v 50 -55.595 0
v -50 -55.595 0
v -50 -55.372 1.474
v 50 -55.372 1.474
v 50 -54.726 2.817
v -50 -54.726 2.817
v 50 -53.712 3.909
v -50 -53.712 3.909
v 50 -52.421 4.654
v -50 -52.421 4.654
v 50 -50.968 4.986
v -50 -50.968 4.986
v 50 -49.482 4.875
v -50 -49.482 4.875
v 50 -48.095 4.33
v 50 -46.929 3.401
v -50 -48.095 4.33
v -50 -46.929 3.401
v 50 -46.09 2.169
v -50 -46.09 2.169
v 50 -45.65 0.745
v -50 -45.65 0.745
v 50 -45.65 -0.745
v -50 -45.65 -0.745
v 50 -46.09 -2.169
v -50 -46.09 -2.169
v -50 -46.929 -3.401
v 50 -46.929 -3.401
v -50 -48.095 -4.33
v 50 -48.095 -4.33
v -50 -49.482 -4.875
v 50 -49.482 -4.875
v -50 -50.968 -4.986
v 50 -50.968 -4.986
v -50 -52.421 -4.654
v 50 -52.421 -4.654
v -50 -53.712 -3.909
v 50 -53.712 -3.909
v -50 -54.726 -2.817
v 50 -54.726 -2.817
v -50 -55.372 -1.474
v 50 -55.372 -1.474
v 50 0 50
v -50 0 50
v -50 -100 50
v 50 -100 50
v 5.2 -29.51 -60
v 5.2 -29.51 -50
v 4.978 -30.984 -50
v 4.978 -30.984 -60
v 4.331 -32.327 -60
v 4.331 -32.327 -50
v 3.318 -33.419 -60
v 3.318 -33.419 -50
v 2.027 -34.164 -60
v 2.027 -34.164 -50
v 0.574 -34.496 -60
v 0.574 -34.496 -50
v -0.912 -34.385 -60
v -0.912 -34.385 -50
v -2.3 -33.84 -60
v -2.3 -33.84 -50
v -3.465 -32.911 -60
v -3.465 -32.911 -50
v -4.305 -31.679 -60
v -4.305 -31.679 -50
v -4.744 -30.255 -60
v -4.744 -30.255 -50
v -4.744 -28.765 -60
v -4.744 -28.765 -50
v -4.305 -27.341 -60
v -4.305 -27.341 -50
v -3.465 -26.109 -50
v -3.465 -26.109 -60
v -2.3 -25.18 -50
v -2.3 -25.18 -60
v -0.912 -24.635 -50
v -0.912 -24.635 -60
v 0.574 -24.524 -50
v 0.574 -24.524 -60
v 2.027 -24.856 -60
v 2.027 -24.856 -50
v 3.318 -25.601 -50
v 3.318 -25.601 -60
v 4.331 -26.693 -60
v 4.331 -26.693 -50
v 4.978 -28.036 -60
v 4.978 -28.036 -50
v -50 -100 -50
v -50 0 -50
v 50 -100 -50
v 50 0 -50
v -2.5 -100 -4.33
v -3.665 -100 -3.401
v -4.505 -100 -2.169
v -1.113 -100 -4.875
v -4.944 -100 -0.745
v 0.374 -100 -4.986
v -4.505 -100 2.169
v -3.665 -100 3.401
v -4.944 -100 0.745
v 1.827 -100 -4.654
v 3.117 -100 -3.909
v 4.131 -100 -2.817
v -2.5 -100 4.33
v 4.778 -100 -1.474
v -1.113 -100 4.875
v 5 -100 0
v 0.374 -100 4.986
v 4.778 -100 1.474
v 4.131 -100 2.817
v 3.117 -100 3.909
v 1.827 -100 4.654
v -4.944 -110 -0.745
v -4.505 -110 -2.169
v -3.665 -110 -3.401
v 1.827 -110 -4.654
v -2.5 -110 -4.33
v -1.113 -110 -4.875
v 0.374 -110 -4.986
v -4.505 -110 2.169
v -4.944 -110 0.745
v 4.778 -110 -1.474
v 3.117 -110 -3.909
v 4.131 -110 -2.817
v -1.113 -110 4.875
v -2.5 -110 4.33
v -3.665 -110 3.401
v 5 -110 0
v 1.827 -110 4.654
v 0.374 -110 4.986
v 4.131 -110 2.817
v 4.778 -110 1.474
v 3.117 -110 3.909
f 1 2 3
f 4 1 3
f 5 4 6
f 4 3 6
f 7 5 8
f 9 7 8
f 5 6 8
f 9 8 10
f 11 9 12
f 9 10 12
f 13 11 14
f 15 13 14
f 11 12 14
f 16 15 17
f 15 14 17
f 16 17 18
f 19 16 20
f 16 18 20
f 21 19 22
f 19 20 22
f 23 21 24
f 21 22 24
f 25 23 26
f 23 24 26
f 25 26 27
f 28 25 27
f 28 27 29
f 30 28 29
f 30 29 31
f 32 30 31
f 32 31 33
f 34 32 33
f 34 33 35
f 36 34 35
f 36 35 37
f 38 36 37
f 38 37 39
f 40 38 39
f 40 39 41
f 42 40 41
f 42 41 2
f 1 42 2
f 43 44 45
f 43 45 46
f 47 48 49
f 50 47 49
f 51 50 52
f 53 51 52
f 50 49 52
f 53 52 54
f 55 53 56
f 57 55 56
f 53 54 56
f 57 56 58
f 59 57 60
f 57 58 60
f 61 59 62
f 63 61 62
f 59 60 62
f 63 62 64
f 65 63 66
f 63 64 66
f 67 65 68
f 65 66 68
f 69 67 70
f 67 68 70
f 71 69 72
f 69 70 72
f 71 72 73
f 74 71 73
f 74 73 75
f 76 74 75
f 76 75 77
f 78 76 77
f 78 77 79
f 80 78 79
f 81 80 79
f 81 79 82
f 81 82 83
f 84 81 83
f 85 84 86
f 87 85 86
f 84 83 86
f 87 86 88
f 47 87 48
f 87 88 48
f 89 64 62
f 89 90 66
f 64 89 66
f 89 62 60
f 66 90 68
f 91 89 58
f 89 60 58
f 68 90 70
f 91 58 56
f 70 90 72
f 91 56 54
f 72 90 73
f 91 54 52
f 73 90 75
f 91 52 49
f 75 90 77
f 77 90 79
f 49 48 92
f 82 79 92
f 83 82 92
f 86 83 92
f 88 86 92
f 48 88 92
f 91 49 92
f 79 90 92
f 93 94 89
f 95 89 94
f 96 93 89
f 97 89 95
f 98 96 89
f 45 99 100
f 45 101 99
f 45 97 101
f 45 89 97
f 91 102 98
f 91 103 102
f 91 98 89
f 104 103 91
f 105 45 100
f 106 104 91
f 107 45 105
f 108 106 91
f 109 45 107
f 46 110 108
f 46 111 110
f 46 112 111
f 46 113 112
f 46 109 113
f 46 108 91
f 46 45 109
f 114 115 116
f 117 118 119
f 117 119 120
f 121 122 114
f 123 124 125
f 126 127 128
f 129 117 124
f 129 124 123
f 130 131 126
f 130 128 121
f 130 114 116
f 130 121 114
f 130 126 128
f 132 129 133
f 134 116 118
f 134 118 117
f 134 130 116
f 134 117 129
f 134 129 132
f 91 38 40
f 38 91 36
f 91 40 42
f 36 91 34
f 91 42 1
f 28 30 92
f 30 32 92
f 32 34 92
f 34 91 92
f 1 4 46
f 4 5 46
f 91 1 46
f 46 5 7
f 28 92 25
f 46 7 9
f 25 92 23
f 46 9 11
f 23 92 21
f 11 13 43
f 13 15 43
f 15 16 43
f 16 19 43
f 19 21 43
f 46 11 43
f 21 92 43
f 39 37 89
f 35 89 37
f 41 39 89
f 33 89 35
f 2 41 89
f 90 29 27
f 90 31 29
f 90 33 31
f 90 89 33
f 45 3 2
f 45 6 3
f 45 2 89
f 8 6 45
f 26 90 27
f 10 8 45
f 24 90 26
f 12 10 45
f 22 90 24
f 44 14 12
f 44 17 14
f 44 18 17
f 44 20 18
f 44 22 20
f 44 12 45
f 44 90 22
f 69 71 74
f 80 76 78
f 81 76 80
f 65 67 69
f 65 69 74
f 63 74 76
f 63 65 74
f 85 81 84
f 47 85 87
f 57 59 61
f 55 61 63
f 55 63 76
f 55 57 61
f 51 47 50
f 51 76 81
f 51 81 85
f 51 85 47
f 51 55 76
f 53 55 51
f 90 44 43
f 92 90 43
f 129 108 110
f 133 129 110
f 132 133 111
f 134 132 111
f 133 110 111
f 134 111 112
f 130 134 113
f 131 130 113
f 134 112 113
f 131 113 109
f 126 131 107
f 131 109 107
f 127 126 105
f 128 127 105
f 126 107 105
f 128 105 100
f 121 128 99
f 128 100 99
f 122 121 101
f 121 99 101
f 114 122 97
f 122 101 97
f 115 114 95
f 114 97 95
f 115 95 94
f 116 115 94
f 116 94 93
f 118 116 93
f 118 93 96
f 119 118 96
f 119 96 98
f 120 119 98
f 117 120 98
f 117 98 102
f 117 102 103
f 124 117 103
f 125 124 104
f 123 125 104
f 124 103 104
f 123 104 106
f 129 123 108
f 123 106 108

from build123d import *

# Parameters (mm, degrees)
F0_W     = 100
F0_H     = 100
F1_DEPTH = 100
F2_R     = 5
F3_DEPTH = 10
F4_R     = 5
F5_DEPTH = 10
F7_D     = 10


with BuildPart() as f1:
    # F0 (on Front) → F1 (new body)
    with BuildSketch(Plane.XZ):
        Rectangle(F0_W, F0_H)
    extrude(amount=F1_DEPTH)

    # F2 (on face) → F3 (join)
    with BuildSketch(Plane.XZ.offset(100)):
        Circle(F2_R)
    extrude(amount=F3_DEPTH)

    # F4 (on face) → F5 (join)
    with BuildSketch(Plane(origin=(0, 0, -50), x_dir=(1, 0, 0), z_dir=(0, 0, -1))):
        with Locations((0.200286, 29.510024)):
            Circle(F4_R)
    extrude(amount=F5_DEPTH)

    # F7 (through all)
    with Locations(Plane.YZ.offset(50)):
        with Locations((-50.594613, 0)):
            Hole(F7_D / 2)


solid = f1.part
